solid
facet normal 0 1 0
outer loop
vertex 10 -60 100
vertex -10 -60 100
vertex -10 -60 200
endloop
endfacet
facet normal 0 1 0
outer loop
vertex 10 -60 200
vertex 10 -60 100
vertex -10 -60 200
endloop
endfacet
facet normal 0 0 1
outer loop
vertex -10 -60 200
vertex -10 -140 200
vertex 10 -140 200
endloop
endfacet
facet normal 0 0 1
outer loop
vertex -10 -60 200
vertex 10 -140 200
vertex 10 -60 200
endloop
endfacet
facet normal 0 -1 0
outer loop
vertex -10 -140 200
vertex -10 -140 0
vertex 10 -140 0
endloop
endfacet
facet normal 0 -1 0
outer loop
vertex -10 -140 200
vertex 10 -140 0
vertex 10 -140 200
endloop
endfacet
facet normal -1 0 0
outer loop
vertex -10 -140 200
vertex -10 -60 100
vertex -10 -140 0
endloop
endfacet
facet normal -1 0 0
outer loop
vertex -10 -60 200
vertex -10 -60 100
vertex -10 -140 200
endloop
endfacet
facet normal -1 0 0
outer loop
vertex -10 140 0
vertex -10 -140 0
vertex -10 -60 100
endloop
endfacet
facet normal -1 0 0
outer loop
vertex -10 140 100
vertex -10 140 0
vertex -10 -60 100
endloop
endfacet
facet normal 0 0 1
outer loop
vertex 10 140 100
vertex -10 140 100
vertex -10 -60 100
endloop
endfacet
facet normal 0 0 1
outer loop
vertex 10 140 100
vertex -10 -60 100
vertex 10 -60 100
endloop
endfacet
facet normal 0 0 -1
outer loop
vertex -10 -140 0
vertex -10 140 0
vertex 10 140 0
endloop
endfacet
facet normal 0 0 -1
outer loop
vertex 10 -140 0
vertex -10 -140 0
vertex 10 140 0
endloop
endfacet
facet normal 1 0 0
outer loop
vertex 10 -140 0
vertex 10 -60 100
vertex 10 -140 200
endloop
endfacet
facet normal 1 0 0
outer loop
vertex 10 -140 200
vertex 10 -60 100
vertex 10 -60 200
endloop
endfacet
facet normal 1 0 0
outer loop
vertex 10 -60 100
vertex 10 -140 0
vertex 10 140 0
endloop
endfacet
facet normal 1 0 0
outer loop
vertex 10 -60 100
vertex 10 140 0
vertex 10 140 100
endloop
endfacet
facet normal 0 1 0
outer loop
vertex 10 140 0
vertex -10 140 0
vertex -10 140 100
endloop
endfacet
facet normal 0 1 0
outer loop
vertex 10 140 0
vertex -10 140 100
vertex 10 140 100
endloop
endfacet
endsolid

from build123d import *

# Parameters (mm, degrees)
SKETCH_1_W      = 20
SKETCH_1_H      = 280
EXTRUDE_1_DEPTH = 100
SKETCH_2_W      = 100
SKETCH_2_H      = 80
EXTRUDE_2_DEPTH = 20


with BuildPart() as part:
    # 草图1 → 凸台-拉伸1 (new body)
    with BuildSketch(Plane.XY):
        Rectangle(SKETCH_1_W, SKETCH_1_H)
    extrude(amount=EXTRUDE_1_DEPTH)

    # 草图2 → 凸台-拉伸2 (add)
    with BuildSketch(Plane.ZY.offset(10)):
        with Locations((150, -100)):
            Rectangle(SKETCH_2_W, SKETCH_2_H)
    extrude(amount=-EXTRUDE_2_DEPTH)


solid = part.part
